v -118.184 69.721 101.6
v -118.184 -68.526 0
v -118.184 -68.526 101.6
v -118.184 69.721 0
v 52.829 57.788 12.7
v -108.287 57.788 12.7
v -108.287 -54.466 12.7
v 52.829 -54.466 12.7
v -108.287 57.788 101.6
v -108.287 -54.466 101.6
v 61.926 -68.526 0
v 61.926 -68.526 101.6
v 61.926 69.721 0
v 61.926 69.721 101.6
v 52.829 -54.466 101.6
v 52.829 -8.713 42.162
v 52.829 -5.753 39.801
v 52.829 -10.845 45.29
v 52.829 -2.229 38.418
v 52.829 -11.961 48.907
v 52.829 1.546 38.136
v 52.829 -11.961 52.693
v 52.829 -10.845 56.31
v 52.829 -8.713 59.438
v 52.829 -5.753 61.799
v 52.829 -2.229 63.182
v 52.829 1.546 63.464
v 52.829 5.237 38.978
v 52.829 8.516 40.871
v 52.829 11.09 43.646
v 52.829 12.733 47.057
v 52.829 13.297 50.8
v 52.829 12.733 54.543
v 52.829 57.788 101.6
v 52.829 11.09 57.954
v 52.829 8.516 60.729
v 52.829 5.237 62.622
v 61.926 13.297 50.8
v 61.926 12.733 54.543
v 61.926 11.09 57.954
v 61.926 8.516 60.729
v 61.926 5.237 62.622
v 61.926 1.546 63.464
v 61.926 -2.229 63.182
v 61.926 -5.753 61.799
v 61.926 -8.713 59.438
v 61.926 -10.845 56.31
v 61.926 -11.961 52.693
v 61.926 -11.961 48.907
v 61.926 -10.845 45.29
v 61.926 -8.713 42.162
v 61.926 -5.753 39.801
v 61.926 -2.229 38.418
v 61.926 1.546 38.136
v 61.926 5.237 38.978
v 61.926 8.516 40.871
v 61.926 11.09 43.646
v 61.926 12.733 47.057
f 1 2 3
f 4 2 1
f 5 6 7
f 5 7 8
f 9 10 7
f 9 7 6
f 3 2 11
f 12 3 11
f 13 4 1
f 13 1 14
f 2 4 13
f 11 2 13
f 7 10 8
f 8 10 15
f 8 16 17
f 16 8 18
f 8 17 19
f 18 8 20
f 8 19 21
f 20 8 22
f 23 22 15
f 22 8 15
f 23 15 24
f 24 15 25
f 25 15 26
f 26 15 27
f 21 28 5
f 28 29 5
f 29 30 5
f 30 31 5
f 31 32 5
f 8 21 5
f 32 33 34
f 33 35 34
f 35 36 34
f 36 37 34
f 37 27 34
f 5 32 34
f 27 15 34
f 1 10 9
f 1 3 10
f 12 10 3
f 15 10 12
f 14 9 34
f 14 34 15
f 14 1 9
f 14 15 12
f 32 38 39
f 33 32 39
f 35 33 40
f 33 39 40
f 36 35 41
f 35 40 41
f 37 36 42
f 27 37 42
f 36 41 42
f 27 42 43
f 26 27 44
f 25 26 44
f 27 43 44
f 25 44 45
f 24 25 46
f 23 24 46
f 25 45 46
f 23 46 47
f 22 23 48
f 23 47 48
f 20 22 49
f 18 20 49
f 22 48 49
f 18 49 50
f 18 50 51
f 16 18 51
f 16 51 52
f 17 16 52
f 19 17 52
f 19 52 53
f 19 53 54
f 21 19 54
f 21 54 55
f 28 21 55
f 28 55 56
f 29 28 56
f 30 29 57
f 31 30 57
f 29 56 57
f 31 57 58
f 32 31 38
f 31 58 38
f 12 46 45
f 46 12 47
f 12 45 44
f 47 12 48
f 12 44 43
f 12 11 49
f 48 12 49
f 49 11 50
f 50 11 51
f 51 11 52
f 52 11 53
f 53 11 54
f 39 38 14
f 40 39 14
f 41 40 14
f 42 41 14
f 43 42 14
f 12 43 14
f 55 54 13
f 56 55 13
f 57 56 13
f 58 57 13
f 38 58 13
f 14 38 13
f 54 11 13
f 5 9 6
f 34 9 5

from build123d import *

# Parameters (mm, degrees)
F0_W     = 180.109705776
F0_H     = 138.2466368377
F1_DEPTH = 101.6
F2_W     = 161.1165106297
F2_H     = 112.253382802
F3_DEPTH = 88.9
F4_R     = 12.7
F5_DEPTH = 9.0965814888


with BuildPart() as f1:
    # F0 (on Top) → F1 (new body)
    with BuildSketch(Plane.XY):
        with Locations((-28.1288344413, 0.5972143263)):
            Rectangle(F0_W, F0_H)
    extrude(amount=F1_DEPTH)

    # F2 (on face) → F3 (cut)
    with BuildSketch(Plane.XY.offset(101.6)):
        with Locations((-27.728818357, 1.6608275473)):
            Rectangle(F2_W, F2_H)
    extrude(amount=-F3_DEPTH, mode=Mode.SUBTRACT)

    # F4 (on face) → F5 (cut, through all)
    with BuildSketch(Plane.YZ.offset(61.9260184467)):
        with Locations((0.5972143263, 50.8)):
            Circle(F4_R)
    extrude(amount=-F5_DEPTH, mode=Mode.SUBTRACT)


solid = f1.part
